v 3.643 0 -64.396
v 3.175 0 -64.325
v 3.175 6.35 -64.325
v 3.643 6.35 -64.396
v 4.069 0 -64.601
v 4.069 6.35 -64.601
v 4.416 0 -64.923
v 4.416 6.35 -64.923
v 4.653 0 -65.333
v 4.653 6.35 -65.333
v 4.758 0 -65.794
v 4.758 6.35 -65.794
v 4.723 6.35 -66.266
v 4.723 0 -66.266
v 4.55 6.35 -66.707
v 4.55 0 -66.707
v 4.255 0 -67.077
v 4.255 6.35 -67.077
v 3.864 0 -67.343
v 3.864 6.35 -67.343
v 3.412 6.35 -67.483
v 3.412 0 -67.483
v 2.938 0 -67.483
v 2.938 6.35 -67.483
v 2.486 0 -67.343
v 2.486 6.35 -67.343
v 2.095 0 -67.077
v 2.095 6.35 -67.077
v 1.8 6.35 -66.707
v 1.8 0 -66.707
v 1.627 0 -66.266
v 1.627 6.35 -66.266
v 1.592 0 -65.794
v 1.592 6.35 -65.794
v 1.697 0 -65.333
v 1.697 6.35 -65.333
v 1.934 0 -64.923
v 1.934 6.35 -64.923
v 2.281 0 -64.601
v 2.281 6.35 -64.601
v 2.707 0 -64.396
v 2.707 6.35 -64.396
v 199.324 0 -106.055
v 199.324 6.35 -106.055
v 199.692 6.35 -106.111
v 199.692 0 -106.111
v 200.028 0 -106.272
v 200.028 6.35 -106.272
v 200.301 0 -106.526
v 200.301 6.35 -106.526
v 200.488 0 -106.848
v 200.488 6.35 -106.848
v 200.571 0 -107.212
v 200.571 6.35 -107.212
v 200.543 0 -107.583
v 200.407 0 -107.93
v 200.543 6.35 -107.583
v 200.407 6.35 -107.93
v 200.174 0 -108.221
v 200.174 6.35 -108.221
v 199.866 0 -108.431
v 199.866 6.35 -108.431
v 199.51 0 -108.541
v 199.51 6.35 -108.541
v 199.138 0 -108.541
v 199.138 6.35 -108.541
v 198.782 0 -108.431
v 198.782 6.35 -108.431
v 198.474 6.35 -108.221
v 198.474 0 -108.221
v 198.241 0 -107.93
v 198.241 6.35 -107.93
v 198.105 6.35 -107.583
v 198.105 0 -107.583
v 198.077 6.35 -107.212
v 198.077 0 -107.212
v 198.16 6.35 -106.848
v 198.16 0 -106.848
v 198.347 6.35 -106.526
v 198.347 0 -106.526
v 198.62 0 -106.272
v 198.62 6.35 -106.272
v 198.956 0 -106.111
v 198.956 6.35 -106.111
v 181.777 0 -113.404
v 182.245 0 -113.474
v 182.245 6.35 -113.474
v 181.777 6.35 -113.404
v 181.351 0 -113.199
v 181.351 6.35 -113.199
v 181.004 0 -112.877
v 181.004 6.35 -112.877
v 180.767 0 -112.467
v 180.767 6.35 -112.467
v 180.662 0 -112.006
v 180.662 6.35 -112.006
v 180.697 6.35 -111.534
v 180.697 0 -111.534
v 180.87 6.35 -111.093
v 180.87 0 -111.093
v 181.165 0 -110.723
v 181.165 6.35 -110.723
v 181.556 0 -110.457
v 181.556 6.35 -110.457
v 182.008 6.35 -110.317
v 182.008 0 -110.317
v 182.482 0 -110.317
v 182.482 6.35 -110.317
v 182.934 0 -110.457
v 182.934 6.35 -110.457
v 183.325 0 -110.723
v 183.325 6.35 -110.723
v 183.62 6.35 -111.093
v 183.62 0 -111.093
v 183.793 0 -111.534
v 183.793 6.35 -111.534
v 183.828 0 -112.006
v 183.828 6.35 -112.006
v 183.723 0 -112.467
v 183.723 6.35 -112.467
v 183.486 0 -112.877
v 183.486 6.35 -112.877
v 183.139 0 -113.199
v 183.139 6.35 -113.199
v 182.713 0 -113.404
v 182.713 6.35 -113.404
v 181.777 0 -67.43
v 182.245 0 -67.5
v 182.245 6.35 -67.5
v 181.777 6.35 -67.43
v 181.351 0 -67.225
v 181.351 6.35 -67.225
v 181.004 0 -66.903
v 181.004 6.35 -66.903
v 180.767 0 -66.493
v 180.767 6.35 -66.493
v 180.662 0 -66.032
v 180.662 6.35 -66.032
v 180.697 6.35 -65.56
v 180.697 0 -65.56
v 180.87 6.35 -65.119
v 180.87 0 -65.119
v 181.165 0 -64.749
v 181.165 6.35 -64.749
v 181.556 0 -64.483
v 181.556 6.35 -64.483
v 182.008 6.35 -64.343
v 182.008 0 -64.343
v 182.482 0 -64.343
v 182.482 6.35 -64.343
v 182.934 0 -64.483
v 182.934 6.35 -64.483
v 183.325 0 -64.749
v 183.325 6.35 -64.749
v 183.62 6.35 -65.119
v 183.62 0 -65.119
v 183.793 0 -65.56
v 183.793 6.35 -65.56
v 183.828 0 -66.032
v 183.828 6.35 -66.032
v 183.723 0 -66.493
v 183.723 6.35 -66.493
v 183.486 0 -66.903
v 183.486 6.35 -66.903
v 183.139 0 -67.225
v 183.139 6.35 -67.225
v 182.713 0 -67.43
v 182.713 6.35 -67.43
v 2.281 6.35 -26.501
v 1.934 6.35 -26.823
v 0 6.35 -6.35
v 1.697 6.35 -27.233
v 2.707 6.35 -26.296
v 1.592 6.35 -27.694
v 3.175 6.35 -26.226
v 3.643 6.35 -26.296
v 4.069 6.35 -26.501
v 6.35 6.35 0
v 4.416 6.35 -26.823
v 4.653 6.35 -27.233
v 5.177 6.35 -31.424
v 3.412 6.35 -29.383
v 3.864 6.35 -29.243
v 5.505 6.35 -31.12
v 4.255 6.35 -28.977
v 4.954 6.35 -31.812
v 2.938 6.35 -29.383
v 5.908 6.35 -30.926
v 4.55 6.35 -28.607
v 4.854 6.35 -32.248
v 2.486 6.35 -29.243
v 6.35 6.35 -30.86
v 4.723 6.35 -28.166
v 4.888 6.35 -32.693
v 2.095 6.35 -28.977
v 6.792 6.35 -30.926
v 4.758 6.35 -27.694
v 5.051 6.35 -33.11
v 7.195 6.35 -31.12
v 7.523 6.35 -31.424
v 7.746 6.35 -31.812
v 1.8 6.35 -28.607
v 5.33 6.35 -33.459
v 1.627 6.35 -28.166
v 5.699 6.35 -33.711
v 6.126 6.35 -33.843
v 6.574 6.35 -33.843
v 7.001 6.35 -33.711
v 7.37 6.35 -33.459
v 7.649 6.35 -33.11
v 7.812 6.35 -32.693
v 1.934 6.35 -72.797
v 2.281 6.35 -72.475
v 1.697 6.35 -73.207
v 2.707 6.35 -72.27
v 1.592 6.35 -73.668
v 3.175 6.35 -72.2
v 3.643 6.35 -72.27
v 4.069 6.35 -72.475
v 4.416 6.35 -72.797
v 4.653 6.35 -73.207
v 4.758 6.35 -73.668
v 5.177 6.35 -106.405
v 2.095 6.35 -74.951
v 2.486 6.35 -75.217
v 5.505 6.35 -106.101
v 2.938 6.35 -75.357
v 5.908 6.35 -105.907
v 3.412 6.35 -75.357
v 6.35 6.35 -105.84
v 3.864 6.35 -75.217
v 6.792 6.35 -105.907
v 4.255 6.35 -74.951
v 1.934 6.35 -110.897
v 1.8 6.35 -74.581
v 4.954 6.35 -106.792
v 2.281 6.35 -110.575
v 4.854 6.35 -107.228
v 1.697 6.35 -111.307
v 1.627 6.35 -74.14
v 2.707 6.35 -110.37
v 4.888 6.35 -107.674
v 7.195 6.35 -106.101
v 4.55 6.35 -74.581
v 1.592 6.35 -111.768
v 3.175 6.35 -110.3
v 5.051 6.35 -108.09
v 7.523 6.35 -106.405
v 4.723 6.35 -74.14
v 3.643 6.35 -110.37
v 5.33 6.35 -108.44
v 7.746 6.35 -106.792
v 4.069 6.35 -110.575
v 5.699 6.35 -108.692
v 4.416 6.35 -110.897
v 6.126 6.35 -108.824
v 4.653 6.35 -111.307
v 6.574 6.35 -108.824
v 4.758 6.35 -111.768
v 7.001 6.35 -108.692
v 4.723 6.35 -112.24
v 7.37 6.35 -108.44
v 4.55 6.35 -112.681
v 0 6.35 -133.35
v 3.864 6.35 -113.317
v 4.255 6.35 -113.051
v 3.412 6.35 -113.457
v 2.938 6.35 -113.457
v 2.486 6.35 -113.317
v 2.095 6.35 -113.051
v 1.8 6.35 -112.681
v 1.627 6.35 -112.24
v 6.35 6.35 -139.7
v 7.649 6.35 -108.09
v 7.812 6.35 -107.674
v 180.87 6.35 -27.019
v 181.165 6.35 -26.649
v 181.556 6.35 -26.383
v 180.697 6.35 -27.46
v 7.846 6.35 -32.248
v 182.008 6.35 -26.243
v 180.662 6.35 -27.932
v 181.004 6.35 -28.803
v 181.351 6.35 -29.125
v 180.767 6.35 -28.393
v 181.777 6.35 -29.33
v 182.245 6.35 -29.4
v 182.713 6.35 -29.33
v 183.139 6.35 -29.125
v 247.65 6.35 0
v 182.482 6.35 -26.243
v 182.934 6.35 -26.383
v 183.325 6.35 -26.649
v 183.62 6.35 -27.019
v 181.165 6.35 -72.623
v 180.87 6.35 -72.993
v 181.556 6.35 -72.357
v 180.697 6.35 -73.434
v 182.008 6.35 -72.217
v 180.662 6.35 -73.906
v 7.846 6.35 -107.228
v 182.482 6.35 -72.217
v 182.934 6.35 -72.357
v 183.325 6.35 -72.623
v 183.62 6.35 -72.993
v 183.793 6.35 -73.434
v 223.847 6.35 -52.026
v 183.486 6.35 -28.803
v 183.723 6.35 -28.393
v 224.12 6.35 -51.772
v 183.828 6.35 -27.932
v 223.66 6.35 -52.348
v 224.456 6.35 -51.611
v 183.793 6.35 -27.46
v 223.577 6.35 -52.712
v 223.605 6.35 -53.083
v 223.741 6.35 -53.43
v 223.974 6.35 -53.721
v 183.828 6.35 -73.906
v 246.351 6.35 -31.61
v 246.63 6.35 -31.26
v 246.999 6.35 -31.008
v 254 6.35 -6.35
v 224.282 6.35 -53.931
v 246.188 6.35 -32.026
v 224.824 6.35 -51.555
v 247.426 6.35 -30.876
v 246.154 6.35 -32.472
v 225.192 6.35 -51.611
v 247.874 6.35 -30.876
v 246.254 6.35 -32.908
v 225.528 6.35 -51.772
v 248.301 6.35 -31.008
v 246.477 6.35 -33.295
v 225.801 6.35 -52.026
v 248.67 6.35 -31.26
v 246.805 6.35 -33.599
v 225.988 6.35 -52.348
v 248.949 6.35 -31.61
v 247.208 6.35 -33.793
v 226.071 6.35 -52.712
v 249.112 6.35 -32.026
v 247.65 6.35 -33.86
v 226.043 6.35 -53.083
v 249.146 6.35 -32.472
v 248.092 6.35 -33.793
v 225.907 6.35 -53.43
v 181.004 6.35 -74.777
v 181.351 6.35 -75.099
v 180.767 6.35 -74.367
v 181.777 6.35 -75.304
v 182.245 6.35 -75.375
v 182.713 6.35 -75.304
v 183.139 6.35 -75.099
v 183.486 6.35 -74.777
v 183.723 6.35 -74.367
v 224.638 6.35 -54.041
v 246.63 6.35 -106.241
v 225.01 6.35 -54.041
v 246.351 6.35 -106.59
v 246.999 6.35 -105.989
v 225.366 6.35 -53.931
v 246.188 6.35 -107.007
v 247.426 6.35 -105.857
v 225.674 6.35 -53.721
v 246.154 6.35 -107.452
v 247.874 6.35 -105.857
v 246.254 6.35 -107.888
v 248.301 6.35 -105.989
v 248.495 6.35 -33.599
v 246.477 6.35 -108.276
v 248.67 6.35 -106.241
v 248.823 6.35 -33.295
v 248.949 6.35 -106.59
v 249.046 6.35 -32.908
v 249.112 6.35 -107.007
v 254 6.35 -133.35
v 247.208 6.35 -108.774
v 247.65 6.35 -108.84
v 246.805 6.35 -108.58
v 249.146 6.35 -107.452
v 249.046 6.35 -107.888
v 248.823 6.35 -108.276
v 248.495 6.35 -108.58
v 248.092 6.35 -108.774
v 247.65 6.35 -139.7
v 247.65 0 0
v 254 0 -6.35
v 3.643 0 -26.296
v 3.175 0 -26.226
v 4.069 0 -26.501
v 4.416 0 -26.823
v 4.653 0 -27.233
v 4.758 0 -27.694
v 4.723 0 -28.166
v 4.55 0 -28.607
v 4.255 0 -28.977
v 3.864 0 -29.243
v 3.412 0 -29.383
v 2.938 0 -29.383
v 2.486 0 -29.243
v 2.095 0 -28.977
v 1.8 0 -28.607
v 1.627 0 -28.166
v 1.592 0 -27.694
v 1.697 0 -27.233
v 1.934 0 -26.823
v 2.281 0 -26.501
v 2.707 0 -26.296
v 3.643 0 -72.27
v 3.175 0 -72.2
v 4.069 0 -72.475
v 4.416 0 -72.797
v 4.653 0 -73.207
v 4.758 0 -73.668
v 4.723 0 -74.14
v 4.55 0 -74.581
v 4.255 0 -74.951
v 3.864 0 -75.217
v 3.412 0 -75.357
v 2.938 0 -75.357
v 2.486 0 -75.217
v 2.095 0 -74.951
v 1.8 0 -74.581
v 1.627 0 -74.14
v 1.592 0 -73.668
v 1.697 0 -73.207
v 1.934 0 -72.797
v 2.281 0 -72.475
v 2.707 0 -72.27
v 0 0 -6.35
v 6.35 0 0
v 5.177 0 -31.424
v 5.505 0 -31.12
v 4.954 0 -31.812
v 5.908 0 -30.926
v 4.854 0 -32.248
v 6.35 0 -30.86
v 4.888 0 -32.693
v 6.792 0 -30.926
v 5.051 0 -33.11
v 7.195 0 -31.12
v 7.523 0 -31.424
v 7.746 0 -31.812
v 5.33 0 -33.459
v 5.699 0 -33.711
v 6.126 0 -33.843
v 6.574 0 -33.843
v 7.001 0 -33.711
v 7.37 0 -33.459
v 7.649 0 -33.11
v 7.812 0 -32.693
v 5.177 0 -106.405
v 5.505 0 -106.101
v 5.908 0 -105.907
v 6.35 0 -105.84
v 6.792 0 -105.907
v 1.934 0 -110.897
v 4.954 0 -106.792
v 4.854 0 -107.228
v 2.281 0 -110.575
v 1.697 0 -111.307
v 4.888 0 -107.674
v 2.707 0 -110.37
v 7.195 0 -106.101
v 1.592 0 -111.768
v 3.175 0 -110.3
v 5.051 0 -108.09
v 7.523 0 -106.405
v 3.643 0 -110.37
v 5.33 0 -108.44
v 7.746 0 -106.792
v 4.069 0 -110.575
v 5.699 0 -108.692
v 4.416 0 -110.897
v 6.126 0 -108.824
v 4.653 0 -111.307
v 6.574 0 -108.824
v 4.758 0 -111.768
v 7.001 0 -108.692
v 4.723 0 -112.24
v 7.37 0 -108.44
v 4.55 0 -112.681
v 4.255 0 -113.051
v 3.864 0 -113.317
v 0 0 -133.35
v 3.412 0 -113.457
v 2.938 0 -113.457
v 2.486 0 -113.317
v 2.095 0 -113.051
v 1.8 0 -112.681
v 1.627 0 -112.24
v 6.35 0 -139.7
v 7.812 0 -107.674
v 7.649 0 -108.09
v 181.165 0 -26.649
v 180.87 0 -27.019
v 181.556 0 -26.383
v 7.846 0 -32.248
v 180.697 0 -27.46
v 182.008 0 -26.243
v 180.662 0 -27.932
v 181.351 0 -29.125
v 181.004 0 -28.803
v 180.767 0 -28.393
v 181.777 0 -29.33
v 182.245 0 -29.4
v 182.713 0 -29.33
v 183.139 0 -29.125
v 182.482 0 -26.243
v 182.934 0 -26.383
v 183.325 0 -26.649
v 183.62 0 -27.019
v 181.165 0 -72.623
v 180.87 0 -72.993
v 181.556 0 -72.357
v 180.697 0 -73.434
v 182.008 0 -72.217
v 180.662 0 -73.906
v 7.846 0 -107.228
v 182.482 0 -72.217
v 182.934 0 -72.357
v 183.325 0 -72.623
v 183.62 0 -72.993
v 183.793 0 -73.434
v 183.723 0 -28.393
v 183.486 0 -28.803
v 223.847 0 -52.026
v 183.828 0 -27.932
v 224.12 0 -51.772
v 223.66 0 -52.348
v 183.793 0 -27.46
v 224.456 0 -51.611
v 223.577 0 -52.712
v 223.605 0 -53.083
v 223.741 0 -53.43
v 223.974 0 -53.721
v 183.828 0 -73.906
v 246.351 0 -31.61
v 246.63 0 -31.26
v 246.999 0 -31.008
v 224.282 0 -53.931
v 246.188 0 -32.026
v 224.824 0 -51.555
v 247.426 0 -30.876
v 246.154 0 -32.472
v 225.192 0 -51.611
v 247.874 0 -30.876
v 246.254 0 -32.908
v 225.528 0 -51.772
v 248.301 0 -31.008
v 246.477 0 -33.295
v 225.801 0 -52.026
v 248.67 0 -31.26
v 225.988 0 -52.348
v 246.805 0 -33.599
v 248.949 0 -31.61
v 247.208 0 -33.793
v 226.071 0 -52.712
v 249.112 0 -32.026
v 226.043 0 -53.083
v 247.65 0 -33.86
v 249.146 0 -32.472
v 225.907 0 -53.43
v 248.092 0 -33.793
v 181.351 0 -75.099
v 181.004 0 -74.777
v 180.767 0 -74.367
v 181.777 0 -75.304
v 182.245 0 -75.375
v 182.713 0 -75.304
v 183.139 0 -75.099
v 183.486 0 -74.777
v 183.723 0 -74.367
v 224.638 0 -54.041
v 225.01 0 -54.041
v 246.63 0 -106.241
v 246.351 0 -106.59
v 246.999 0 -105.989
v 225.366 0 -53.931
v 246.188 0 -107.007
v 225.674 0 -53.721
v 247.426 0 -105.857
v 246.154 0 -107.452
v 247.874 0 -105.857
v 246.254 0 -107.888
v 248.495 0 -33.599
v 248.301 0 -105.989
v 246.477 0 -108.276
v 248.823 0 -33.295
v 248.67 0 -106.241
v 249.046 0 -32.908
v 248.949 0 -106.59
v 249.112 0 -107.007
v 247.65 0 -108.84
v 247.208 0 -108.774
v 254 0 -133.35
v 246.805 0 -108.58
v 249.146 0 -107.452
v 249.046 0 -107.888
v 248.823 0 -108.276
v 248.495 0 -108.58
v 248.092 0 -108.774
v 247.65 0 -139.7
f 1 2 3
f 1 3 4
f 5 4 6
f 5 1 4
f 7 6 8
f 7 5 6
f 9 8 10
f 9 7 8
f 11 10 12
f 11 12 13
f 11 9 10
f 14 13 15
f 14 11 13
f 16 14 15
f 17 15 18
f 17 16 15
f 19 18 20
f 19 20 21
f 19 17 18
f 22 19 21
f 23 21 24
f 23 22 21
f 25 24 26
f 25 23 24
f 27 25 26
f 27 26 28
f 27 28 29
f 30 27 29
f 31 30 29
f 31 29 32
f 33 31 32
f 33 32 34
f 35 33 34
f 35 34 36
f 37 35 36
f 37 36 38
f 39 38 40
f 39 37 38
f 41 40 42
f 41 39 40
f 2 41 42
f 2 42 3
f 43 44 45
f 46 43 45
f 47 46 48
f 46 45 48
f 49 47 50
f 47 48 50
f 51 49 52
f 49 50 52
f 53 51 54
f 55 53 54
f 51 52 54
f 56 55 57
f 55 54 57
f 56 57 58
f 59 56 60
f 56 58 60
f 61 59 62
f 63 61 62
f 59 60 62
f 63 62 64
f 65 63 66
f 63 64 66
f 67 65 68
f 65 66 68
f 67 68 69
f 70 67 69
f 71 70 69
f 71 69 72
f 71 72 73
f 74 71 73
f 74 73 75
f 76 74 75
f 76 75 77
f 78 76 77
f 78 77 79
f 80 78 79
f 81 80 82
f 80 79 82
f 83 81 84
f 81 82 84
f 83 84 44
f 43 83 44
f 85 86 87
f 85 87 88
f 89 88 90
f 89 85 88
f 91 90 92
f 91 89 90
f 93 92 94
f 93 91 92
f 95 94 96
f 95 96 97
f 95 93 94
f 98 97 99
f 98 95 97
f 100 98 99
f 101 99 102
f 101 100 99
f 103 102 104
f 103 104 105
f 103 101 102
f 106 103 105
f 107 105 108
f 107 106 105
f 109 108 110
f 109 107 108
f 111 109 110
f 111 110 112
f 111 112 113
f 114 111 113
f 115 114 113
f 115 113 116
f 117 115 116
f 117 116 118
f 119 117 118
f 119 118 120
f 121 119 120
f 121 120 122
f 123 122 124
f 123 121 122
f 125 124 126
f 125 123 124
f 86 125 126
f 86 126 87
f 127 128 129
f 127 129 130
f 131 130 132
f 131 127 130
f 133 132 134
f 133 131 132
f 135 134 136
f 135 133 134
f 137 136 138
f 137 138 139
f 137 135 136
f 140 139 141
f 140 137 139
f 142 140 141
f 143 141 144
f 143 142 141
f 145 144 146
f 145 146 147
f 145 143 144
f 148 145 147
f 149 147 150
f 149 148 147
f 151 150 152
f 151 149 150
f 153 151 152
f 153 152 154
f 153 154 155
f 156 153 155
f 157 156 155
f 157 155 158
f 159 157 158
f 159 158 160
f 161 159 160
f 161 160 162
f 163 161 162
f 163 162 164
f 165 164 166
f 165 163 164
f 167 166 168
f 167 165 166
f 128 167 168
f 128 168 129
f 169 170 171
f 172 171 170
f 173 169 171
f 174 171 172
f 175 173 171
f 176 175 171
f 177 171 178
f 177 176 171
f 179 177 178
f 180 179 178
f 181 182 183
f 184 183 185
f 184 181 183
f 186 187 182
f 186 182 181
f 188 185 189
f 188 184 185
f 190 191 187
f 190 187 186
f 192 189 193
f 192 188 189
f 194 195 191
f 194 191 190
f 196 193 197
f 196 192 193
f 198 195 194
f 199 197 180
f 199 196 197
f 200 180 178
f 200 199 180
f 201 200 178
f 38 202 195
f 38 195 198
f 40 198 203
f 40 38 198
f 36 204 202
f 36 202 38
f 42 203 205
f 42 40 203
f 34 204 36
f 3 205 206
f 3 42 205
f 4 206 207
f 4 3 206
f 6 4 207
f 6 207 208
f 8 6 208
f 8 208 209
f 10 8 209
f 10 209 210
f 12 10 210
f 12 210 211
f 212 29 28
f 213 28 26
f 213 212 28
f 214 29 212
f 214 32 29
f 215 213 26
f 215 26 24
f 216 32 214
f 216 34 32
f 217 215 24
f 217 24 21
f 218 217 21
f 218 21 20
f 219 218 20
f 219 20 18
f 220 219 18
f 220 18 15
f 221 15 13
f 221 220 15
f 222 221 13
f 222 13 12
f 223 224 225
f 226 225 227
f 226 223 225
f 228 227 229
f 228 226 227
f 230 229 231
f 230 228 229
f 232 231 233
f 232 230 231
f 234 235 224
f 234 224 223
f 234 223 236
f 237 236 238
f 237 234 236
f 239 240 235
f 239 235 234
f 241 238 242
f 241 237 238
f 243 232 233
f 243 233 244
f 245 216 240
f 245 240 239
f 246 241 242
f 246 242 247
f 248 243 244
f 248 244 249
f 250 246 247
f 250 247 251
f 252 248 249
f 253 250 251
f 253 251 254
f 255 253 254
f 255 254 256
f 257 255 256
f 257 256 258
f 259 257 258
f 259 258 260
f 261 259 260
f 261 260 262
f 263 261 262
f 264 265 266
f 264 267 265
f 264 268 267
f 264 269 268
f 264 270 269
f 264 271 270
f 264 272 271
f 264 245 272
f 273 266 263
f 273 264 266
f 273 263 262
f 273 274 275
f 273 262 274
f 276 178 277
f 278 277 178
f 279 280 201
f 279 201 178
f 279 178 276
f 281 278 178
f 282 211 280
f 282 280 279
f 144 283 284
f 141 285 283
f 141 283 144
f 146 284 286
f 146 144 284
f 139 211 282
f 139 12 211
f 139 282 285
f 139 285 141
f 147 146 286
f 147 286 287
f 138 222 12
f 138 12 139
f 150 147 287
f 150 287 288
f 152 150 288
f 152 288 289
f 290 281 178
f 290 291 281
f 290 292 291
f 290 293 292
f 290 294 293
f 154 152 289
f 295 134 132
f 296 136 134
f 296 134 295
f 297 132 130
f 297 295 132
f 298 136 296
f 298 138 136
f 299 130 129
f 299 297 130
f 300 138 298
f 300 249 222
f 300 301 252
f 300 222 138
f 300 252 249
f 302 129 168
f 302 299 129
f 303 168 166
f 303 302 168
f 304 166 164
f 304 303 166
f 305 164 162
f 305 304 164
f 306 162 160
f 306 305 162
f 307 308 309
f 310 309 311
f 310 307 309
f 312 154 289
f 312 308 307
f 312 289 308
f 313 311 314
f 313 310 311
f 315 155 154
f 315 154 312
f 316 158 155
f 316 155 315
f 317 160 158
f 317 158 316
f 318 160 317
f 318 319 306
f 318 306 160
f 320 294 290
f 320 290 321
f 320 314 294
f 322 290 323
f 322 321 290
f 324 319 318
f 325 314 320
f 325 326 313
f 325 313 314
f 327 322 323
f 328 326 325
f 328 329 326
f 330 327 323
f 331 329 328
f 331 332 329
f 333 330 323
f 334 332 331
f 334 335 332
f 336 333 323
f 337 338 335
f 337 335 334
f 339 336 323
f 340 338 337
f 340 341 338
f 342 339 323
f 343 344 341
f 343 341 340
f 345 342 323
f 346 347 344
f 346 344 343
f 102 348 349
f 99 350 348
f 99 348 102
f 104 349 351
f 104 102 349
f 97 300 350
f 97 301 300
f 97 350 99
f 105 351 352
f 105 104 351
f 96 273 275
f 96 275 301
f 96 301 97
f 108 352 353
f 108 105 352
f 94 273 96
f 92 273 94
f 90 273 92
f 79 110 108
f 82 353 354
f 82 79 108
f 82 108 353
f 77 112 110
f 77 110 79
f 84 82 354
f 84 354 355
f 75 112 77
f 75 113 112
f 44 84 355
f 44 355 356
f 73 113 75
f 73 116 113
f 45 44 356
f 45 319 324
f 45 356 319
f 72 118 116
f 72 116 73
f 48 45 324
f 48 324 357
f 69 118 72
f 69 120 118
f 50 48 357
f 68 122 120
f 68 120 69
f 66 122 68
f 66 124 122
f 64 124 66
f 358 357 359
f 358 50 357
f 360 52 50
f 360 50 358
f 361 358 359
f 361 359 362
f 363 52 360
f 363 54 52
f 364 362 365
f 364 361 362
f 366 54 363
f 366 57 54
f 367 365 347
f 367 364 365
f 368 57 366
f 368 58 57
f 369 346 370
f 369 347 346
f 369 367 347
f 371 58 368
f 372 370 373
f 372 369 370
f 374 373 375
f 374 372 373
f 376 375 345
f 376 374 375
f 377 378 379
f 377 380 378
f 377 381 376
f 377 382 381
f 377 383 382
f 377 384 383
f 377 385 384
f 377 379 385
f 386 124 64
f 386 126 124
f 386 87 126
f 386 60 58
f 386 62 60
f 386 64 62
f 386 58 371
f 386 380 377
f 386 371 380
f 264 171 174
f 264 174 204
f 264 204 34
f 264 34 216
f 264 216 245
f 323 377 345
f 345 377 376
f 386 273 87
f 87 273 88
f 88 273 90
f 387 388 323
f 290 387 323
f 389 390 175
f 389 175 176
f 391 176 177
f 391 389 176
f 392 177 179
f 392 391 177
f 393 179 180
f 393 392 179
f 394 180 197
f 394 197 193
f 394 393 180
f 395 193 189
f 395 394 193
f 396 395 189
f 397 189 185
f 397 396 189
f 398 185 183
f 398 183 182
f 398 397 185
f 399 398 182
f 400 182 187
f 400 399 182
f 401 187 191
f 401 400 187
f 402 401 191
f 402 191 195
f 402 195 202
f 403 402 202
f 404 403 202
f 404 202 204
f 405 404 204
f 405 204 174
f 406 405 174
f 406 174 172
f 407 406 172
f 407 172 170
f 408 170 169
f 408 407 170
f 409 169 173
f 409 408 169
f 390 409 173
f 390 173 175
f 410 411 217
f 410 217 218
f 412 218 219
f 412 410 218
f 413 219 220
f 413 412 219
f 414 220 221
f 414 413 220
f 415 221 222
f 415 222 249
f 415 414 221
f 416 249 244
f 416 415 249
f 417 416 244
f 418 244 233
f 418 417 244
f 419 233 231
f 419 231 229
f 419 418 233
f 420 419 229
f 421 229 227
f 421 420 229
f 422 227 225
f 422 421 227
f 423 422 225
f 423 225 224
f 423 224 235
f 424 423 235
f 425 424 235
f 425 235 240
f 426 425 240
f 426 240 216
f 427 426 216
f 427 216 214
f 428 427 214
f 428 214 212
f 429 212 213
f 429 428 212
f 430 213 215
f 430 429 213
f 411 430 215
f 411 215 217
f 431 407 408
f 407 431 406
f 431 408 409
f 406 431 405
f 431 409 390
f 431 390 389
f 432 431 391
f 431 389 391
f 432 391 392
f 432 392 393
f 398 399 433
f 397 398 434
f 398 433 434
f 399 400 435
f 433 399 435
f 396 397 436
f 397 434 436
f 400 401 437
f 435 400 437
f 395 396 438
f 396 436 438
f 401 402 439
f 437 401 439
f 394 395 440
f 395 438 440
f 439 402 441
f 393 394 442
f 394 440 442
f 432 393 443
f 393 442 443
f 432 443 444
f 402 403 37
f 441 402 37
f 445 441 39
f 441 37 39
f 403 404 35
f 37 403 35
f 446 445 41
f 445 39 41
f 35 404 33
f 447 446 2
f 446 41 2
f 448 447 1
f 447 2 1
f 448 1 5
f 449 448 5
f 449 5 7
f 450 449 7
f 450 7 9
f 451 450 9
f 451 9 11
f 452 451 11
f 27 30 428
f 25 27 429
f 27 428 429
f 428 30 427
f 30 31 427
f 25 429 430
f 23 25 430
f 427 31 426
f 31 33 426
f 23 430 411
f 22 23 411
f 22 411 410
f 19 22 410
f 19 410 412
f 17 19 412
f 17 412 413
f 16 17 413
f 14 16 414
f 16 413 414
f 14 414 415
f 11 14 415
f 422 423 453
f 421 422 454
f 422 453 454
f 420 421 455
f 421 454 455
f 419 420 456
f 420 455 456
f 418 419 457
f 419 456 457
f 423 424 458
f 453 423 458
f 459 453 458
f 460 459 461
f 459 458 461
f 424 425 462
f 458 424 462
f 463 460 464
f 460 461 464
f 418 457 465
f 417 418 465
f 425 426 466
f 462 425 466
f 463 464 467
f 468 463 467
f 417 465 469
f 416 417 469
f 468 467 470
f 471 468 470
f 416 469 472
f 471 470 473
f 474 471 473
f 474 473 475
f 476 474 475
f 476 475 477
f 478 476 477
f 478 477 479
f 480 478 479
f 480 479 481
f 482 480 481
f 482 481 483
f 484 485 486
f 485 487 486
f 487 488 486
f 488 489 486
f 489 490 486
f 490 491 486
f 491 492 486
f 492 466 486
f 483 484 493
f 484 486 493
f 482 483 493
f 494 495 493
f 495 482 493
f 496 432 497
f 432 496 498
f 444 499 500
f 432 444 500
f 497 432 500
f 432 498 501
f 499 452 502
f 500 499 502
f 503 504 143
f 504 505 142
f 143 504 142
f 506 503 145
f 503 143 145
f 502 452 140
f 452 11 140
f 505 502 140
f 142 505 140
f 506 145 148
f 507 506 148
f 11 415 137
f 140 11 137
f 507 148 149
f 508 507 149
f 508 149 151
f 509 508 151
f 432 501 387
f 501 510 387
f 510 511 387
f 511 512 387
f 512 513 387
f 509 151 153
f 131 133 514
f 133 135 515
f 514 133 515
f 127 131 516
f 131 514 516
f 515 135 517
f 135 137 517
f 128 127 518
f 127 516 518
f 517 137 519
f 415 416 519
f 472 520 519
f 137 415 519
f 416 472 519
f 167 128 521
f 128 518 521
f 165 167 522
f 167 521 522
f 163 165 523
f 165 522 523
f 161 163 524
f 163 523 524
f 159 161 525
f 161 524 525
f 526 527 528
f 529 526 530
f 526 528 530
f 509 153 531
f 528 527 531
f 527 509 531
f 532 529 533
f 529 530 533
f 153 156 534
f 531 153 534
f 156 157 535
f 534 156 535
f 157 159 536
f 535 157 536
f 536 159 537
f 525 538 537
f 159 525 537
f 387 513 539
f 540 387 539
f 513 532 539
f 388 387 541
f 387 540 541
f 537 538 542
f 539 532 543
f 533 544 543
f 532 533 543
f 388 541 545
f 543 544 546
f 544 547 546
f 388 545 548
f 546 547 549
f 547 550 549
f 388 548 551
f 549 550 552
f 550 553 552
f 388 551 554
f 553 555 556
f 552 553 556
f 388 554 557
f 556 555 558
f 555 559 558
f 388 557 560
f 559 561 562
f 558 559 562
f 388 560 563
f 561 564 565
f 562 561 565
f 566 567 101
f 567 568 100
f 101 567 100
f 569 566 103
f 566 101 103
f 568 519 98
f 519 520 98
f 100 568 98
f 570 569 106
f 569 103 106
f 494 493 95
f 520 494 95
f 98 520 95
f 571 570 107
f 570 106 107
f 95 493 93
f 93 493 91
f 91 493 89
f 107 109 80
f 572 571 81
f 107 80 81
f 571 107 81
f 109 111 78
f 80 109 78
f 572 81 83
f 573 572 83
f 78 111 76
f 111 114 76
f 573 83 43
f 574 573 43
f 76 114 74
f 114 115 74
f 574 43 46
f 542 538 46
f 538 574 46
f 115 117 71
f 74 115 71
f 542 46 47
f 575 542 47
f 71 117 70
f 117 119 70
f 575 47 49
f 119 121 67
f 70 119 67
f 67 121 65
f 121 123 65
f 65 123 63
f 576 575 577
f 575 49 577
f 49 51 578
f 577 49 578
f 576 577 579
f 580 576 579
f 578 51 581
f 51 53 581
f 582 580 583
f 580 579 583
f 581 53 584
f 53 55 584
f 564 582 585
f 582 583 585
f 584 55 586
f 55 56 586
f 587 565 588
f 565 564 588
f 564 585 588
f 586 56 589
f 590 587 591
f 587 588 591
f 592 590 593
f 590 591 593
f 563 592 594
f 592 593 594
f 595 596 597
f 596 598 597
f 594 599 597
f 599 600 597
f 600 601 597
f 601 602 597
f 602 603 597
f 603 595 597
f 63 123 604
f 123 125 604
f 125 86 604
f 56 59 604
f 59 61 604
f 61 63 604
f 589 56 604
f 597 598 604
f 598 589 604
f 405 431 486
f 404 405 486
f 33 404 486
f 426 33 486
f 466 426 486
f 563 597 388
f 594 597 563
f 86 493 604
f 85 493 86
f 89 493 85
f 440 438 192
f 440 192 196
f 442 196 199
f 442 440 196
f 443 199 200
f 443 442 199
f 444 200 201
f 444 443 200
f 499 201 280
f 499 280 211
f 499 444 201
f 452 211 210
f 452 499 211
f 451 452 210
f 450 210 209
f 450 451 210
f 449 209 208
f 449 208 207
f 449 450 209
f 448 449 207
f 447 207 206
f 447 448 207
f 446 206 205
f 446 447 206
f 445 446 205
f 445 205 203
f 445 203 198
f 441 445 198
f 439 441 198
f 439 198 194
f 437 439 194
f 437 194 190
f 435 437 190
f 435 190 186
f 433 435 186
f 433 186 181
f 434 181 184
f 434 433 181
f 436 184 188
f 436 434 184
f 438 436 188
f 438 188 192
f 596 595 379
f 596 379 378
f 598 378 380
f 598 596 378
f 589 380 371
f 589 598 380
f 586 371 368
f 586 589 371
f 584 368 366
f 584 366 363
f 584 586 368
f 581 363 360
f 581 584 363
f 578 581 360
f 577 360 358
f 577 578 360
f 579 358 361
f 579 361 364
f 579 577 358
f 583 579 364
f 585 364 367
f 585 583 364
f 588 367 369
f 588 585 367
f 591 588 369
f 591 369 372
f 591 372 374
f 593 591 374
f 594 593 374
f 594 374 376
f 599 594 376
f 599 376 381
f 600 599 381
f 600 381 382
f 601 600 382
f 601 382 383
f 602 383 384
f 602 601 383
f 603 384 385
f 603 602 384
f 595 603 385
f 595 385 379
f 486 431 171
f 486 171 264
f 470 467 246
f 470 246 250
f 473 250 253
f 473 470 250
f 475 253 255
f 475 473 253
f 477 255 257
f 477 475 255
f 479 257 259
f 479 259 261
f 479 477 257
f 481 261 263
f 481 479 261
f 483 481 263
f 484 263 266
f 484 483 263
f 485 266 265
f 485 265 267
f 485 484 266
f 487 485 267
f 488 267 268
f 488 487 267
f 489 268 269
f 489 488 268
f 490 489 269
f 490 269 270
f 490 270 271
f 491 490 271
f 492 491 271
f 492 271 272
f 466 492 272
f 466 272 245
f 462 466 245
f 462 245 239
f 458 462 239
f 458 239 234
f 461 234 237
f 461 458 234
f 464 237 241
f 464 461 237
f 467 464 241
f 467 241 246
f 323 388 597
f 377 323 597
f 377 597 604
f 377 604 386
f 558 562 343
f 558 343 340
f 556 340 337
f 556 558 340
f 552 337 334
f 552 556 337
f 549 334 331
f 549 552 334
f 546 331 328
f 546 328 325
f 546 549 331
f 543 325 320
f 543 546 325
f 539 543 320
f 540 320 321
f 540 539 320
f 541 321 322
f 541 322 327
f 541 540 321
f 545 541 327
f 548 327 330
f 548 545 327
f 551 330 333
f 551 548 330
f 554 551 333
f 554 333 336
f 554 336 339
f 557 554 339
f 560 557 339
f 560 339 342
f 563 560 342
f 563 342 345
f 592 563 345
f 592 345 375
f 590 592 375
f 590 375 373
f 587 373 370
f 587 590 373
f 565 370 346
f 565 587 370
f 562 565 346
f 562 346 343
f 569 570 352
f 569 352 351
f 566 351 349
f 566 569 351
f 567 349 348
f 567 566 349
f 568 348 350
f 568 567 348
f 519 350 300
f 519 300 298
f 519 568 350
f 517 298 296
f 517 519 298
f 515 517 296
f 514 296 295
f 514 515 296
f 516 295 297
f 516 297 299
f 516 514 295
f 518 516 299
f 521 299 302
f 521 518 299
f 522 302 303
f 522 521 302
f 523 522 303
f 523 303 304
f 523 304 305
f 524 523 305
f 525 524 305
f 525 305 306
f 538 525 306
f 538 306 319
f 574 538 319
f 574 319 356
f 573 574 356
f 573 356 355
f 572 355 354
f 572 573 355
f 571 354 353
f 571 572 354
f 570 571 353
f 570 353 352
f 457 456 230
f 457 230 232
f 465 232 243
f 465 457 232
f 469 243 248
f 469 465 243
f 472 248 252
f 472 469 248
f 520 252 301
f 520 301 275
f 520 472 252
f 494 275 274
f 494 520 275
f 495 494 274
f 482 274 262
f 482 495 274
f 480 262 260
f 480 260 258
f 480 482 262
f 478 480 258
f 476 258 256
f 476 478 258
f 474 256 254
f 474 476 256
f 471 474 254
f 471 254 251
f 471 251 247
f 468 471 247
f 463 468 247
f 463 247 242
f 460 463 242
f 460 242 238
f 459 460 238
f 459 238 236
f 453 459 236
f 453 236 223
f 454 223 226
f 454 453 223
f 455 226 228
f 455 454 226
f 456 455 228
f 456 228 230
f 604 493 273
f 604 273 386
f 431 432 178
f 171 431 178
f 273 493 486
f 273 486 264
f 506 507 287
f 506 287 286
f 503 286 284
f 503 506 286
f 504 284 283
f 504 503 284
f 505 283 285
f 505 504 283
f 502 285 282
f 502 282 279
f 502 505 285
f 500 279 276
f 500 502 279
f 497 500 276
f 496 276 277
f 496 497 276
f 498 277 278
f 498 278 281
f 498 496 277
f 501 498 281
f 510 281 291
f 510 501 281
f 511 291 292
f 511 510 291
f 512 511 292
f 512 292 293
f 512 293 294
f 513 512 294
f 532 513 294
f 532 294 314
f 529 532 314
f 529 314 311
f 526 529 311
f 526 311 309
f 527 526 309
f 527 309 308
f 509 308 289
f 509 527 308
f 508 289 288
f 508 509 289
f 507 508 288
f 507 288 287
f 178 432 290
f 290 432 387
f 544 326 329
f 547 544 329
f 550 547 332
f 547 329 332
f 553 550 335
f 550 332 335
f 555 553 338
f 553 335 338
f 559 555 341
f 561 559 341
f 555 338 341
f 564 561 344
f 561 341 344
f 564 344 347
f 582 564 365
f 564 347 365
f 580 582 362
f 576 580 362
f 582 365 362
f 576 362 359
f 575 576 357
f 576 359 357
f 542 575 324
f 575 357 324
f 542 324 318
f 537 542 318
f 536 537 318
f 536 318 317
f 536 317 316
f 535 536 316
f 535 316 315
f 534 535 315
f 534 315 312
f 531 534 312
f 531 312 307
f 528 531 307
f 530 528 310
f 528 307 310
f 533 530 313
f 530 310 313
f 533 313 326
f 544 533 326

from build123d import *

# Parameters (mm, degrees)
SKETCH1_W           = 254
SKETCH1_H           = 139.7
SKETCH1_R           = 1.5
SKETCH1_R_2         = 1.5875
BOSS_EXTRUDE1_DEPTH = 6.35
SKETCH2_R           = 1.25
CUT_EXTRUDE1_DEPTH  = 6.35
CHAMFER1_SIZE       = 6.35


with BuildPart() as part:
    # Sketch1 → Boss-Extrude1 (new body)
    with BuildSketch(Plane(origin=(0, 0, 0), x_dir=(1, 0, 0), z_dir=(0, 1, 0))):
        with Locations((127, 69.85)):
            Rectangle(SKETCH1_W, SKETCH1_H)
        with Locations(Location((6.35, 107.3404, 0), (0, 0, 270))):
            Circle(SKETCH1_R, mode=Mode.SUBTRACT)
        with Locations(Location((6.35, 32.3596, 0), (0, 0, 270))):
            Circle(SKETCH1_R, mode=Mode.SUBTRACT)
        with Locations(Location((247.65, 107.3404, 0), (0, 0, 90))):
            Circle(SKETCH1_R, mode=Mode.SUBTRACT)
        with Locations(Location((247.65, 32.3596, 0), (0, 0, 90))):
            Circle(SKETCH1_R, mode=Mode.SUBTRACT)
        with Locations(Location((3.175, 73.787, 0), (0, 0, 270))):
            Circle(SKETCH1_R_2, mode=Mode.SUBTRACT)
        with Locations(Location((3.175, 65.913, 0), (0, 0, 270))):
            Circle(SKETCH1_R_2, mode=Mode.SUBTRACT)
        with Locations(Location((3.175, 27.813, 0), (0, 0, 270))):
            Circle(SKETCH1_R_2, mode=Mode.SUBTRACT)
        with Locations(Location((3.175, 111.887, 0), (0, 0, 270))):
            Circle(SKETCH1_R_2, mode=Mode.SUBTRACT)
        with Locations(Location((182.245, 27.813, 0), (0, 0, 90))):
            Circle(SKETCH1_R_2, mode=Mode.SUBTRACT)
        with Locations(Location((182.245, 65.913, 0), (0, 0, 90))):
            Circle(SKETCH1_R_2, mode=Mode.SUBTRACT)
        with Locations(Location((182.245, 73.787, 0), (0, 0, 90))):
            Circle(SKETCH1_R_2, mode=Mode.SUBTRACT)
        with Locations(Location((182.245, 111.887, 0), (0, 0, 90))):
            Circle(SKETCH1_R_2, mode=Mode.SUBTRACT)
    extrude(amount=BOSS_EXTRUDE1_DEPTH)

    # Sketch2 → Cut-Extrude1 (cut)
    with BuildSketch(Plane(origin=(0, 6.35, 0), x_dir=(1, 0, 0), z_dir=(0, 1, 0))):
        with Locations(Location((199.324, 107.305, 0), (0, 0, 270))):
            Circle(SKETCH2_R)
        with Locations(Location((224.824, 52.805, 0), (0, 0, 270))):
            Circle(SKETCH2_R)
    extrude(amount=-CUT_EXTRUDE1_DEPTH, mode=Mode.SUBTRACT)

    # Chamfer1
    chamfer1_edges = [part.edges().sort_by_distance(p)[0] for p in [
        (254, 3.175, 0),
        (0, 3.175, 0),
        (0, 3.175, -139.7),
        (254, 3.175, -139.7),
    ]]
    chamfer(chamfer1_edges, length=CHAMFER1_SIZE)


solid = part.part
